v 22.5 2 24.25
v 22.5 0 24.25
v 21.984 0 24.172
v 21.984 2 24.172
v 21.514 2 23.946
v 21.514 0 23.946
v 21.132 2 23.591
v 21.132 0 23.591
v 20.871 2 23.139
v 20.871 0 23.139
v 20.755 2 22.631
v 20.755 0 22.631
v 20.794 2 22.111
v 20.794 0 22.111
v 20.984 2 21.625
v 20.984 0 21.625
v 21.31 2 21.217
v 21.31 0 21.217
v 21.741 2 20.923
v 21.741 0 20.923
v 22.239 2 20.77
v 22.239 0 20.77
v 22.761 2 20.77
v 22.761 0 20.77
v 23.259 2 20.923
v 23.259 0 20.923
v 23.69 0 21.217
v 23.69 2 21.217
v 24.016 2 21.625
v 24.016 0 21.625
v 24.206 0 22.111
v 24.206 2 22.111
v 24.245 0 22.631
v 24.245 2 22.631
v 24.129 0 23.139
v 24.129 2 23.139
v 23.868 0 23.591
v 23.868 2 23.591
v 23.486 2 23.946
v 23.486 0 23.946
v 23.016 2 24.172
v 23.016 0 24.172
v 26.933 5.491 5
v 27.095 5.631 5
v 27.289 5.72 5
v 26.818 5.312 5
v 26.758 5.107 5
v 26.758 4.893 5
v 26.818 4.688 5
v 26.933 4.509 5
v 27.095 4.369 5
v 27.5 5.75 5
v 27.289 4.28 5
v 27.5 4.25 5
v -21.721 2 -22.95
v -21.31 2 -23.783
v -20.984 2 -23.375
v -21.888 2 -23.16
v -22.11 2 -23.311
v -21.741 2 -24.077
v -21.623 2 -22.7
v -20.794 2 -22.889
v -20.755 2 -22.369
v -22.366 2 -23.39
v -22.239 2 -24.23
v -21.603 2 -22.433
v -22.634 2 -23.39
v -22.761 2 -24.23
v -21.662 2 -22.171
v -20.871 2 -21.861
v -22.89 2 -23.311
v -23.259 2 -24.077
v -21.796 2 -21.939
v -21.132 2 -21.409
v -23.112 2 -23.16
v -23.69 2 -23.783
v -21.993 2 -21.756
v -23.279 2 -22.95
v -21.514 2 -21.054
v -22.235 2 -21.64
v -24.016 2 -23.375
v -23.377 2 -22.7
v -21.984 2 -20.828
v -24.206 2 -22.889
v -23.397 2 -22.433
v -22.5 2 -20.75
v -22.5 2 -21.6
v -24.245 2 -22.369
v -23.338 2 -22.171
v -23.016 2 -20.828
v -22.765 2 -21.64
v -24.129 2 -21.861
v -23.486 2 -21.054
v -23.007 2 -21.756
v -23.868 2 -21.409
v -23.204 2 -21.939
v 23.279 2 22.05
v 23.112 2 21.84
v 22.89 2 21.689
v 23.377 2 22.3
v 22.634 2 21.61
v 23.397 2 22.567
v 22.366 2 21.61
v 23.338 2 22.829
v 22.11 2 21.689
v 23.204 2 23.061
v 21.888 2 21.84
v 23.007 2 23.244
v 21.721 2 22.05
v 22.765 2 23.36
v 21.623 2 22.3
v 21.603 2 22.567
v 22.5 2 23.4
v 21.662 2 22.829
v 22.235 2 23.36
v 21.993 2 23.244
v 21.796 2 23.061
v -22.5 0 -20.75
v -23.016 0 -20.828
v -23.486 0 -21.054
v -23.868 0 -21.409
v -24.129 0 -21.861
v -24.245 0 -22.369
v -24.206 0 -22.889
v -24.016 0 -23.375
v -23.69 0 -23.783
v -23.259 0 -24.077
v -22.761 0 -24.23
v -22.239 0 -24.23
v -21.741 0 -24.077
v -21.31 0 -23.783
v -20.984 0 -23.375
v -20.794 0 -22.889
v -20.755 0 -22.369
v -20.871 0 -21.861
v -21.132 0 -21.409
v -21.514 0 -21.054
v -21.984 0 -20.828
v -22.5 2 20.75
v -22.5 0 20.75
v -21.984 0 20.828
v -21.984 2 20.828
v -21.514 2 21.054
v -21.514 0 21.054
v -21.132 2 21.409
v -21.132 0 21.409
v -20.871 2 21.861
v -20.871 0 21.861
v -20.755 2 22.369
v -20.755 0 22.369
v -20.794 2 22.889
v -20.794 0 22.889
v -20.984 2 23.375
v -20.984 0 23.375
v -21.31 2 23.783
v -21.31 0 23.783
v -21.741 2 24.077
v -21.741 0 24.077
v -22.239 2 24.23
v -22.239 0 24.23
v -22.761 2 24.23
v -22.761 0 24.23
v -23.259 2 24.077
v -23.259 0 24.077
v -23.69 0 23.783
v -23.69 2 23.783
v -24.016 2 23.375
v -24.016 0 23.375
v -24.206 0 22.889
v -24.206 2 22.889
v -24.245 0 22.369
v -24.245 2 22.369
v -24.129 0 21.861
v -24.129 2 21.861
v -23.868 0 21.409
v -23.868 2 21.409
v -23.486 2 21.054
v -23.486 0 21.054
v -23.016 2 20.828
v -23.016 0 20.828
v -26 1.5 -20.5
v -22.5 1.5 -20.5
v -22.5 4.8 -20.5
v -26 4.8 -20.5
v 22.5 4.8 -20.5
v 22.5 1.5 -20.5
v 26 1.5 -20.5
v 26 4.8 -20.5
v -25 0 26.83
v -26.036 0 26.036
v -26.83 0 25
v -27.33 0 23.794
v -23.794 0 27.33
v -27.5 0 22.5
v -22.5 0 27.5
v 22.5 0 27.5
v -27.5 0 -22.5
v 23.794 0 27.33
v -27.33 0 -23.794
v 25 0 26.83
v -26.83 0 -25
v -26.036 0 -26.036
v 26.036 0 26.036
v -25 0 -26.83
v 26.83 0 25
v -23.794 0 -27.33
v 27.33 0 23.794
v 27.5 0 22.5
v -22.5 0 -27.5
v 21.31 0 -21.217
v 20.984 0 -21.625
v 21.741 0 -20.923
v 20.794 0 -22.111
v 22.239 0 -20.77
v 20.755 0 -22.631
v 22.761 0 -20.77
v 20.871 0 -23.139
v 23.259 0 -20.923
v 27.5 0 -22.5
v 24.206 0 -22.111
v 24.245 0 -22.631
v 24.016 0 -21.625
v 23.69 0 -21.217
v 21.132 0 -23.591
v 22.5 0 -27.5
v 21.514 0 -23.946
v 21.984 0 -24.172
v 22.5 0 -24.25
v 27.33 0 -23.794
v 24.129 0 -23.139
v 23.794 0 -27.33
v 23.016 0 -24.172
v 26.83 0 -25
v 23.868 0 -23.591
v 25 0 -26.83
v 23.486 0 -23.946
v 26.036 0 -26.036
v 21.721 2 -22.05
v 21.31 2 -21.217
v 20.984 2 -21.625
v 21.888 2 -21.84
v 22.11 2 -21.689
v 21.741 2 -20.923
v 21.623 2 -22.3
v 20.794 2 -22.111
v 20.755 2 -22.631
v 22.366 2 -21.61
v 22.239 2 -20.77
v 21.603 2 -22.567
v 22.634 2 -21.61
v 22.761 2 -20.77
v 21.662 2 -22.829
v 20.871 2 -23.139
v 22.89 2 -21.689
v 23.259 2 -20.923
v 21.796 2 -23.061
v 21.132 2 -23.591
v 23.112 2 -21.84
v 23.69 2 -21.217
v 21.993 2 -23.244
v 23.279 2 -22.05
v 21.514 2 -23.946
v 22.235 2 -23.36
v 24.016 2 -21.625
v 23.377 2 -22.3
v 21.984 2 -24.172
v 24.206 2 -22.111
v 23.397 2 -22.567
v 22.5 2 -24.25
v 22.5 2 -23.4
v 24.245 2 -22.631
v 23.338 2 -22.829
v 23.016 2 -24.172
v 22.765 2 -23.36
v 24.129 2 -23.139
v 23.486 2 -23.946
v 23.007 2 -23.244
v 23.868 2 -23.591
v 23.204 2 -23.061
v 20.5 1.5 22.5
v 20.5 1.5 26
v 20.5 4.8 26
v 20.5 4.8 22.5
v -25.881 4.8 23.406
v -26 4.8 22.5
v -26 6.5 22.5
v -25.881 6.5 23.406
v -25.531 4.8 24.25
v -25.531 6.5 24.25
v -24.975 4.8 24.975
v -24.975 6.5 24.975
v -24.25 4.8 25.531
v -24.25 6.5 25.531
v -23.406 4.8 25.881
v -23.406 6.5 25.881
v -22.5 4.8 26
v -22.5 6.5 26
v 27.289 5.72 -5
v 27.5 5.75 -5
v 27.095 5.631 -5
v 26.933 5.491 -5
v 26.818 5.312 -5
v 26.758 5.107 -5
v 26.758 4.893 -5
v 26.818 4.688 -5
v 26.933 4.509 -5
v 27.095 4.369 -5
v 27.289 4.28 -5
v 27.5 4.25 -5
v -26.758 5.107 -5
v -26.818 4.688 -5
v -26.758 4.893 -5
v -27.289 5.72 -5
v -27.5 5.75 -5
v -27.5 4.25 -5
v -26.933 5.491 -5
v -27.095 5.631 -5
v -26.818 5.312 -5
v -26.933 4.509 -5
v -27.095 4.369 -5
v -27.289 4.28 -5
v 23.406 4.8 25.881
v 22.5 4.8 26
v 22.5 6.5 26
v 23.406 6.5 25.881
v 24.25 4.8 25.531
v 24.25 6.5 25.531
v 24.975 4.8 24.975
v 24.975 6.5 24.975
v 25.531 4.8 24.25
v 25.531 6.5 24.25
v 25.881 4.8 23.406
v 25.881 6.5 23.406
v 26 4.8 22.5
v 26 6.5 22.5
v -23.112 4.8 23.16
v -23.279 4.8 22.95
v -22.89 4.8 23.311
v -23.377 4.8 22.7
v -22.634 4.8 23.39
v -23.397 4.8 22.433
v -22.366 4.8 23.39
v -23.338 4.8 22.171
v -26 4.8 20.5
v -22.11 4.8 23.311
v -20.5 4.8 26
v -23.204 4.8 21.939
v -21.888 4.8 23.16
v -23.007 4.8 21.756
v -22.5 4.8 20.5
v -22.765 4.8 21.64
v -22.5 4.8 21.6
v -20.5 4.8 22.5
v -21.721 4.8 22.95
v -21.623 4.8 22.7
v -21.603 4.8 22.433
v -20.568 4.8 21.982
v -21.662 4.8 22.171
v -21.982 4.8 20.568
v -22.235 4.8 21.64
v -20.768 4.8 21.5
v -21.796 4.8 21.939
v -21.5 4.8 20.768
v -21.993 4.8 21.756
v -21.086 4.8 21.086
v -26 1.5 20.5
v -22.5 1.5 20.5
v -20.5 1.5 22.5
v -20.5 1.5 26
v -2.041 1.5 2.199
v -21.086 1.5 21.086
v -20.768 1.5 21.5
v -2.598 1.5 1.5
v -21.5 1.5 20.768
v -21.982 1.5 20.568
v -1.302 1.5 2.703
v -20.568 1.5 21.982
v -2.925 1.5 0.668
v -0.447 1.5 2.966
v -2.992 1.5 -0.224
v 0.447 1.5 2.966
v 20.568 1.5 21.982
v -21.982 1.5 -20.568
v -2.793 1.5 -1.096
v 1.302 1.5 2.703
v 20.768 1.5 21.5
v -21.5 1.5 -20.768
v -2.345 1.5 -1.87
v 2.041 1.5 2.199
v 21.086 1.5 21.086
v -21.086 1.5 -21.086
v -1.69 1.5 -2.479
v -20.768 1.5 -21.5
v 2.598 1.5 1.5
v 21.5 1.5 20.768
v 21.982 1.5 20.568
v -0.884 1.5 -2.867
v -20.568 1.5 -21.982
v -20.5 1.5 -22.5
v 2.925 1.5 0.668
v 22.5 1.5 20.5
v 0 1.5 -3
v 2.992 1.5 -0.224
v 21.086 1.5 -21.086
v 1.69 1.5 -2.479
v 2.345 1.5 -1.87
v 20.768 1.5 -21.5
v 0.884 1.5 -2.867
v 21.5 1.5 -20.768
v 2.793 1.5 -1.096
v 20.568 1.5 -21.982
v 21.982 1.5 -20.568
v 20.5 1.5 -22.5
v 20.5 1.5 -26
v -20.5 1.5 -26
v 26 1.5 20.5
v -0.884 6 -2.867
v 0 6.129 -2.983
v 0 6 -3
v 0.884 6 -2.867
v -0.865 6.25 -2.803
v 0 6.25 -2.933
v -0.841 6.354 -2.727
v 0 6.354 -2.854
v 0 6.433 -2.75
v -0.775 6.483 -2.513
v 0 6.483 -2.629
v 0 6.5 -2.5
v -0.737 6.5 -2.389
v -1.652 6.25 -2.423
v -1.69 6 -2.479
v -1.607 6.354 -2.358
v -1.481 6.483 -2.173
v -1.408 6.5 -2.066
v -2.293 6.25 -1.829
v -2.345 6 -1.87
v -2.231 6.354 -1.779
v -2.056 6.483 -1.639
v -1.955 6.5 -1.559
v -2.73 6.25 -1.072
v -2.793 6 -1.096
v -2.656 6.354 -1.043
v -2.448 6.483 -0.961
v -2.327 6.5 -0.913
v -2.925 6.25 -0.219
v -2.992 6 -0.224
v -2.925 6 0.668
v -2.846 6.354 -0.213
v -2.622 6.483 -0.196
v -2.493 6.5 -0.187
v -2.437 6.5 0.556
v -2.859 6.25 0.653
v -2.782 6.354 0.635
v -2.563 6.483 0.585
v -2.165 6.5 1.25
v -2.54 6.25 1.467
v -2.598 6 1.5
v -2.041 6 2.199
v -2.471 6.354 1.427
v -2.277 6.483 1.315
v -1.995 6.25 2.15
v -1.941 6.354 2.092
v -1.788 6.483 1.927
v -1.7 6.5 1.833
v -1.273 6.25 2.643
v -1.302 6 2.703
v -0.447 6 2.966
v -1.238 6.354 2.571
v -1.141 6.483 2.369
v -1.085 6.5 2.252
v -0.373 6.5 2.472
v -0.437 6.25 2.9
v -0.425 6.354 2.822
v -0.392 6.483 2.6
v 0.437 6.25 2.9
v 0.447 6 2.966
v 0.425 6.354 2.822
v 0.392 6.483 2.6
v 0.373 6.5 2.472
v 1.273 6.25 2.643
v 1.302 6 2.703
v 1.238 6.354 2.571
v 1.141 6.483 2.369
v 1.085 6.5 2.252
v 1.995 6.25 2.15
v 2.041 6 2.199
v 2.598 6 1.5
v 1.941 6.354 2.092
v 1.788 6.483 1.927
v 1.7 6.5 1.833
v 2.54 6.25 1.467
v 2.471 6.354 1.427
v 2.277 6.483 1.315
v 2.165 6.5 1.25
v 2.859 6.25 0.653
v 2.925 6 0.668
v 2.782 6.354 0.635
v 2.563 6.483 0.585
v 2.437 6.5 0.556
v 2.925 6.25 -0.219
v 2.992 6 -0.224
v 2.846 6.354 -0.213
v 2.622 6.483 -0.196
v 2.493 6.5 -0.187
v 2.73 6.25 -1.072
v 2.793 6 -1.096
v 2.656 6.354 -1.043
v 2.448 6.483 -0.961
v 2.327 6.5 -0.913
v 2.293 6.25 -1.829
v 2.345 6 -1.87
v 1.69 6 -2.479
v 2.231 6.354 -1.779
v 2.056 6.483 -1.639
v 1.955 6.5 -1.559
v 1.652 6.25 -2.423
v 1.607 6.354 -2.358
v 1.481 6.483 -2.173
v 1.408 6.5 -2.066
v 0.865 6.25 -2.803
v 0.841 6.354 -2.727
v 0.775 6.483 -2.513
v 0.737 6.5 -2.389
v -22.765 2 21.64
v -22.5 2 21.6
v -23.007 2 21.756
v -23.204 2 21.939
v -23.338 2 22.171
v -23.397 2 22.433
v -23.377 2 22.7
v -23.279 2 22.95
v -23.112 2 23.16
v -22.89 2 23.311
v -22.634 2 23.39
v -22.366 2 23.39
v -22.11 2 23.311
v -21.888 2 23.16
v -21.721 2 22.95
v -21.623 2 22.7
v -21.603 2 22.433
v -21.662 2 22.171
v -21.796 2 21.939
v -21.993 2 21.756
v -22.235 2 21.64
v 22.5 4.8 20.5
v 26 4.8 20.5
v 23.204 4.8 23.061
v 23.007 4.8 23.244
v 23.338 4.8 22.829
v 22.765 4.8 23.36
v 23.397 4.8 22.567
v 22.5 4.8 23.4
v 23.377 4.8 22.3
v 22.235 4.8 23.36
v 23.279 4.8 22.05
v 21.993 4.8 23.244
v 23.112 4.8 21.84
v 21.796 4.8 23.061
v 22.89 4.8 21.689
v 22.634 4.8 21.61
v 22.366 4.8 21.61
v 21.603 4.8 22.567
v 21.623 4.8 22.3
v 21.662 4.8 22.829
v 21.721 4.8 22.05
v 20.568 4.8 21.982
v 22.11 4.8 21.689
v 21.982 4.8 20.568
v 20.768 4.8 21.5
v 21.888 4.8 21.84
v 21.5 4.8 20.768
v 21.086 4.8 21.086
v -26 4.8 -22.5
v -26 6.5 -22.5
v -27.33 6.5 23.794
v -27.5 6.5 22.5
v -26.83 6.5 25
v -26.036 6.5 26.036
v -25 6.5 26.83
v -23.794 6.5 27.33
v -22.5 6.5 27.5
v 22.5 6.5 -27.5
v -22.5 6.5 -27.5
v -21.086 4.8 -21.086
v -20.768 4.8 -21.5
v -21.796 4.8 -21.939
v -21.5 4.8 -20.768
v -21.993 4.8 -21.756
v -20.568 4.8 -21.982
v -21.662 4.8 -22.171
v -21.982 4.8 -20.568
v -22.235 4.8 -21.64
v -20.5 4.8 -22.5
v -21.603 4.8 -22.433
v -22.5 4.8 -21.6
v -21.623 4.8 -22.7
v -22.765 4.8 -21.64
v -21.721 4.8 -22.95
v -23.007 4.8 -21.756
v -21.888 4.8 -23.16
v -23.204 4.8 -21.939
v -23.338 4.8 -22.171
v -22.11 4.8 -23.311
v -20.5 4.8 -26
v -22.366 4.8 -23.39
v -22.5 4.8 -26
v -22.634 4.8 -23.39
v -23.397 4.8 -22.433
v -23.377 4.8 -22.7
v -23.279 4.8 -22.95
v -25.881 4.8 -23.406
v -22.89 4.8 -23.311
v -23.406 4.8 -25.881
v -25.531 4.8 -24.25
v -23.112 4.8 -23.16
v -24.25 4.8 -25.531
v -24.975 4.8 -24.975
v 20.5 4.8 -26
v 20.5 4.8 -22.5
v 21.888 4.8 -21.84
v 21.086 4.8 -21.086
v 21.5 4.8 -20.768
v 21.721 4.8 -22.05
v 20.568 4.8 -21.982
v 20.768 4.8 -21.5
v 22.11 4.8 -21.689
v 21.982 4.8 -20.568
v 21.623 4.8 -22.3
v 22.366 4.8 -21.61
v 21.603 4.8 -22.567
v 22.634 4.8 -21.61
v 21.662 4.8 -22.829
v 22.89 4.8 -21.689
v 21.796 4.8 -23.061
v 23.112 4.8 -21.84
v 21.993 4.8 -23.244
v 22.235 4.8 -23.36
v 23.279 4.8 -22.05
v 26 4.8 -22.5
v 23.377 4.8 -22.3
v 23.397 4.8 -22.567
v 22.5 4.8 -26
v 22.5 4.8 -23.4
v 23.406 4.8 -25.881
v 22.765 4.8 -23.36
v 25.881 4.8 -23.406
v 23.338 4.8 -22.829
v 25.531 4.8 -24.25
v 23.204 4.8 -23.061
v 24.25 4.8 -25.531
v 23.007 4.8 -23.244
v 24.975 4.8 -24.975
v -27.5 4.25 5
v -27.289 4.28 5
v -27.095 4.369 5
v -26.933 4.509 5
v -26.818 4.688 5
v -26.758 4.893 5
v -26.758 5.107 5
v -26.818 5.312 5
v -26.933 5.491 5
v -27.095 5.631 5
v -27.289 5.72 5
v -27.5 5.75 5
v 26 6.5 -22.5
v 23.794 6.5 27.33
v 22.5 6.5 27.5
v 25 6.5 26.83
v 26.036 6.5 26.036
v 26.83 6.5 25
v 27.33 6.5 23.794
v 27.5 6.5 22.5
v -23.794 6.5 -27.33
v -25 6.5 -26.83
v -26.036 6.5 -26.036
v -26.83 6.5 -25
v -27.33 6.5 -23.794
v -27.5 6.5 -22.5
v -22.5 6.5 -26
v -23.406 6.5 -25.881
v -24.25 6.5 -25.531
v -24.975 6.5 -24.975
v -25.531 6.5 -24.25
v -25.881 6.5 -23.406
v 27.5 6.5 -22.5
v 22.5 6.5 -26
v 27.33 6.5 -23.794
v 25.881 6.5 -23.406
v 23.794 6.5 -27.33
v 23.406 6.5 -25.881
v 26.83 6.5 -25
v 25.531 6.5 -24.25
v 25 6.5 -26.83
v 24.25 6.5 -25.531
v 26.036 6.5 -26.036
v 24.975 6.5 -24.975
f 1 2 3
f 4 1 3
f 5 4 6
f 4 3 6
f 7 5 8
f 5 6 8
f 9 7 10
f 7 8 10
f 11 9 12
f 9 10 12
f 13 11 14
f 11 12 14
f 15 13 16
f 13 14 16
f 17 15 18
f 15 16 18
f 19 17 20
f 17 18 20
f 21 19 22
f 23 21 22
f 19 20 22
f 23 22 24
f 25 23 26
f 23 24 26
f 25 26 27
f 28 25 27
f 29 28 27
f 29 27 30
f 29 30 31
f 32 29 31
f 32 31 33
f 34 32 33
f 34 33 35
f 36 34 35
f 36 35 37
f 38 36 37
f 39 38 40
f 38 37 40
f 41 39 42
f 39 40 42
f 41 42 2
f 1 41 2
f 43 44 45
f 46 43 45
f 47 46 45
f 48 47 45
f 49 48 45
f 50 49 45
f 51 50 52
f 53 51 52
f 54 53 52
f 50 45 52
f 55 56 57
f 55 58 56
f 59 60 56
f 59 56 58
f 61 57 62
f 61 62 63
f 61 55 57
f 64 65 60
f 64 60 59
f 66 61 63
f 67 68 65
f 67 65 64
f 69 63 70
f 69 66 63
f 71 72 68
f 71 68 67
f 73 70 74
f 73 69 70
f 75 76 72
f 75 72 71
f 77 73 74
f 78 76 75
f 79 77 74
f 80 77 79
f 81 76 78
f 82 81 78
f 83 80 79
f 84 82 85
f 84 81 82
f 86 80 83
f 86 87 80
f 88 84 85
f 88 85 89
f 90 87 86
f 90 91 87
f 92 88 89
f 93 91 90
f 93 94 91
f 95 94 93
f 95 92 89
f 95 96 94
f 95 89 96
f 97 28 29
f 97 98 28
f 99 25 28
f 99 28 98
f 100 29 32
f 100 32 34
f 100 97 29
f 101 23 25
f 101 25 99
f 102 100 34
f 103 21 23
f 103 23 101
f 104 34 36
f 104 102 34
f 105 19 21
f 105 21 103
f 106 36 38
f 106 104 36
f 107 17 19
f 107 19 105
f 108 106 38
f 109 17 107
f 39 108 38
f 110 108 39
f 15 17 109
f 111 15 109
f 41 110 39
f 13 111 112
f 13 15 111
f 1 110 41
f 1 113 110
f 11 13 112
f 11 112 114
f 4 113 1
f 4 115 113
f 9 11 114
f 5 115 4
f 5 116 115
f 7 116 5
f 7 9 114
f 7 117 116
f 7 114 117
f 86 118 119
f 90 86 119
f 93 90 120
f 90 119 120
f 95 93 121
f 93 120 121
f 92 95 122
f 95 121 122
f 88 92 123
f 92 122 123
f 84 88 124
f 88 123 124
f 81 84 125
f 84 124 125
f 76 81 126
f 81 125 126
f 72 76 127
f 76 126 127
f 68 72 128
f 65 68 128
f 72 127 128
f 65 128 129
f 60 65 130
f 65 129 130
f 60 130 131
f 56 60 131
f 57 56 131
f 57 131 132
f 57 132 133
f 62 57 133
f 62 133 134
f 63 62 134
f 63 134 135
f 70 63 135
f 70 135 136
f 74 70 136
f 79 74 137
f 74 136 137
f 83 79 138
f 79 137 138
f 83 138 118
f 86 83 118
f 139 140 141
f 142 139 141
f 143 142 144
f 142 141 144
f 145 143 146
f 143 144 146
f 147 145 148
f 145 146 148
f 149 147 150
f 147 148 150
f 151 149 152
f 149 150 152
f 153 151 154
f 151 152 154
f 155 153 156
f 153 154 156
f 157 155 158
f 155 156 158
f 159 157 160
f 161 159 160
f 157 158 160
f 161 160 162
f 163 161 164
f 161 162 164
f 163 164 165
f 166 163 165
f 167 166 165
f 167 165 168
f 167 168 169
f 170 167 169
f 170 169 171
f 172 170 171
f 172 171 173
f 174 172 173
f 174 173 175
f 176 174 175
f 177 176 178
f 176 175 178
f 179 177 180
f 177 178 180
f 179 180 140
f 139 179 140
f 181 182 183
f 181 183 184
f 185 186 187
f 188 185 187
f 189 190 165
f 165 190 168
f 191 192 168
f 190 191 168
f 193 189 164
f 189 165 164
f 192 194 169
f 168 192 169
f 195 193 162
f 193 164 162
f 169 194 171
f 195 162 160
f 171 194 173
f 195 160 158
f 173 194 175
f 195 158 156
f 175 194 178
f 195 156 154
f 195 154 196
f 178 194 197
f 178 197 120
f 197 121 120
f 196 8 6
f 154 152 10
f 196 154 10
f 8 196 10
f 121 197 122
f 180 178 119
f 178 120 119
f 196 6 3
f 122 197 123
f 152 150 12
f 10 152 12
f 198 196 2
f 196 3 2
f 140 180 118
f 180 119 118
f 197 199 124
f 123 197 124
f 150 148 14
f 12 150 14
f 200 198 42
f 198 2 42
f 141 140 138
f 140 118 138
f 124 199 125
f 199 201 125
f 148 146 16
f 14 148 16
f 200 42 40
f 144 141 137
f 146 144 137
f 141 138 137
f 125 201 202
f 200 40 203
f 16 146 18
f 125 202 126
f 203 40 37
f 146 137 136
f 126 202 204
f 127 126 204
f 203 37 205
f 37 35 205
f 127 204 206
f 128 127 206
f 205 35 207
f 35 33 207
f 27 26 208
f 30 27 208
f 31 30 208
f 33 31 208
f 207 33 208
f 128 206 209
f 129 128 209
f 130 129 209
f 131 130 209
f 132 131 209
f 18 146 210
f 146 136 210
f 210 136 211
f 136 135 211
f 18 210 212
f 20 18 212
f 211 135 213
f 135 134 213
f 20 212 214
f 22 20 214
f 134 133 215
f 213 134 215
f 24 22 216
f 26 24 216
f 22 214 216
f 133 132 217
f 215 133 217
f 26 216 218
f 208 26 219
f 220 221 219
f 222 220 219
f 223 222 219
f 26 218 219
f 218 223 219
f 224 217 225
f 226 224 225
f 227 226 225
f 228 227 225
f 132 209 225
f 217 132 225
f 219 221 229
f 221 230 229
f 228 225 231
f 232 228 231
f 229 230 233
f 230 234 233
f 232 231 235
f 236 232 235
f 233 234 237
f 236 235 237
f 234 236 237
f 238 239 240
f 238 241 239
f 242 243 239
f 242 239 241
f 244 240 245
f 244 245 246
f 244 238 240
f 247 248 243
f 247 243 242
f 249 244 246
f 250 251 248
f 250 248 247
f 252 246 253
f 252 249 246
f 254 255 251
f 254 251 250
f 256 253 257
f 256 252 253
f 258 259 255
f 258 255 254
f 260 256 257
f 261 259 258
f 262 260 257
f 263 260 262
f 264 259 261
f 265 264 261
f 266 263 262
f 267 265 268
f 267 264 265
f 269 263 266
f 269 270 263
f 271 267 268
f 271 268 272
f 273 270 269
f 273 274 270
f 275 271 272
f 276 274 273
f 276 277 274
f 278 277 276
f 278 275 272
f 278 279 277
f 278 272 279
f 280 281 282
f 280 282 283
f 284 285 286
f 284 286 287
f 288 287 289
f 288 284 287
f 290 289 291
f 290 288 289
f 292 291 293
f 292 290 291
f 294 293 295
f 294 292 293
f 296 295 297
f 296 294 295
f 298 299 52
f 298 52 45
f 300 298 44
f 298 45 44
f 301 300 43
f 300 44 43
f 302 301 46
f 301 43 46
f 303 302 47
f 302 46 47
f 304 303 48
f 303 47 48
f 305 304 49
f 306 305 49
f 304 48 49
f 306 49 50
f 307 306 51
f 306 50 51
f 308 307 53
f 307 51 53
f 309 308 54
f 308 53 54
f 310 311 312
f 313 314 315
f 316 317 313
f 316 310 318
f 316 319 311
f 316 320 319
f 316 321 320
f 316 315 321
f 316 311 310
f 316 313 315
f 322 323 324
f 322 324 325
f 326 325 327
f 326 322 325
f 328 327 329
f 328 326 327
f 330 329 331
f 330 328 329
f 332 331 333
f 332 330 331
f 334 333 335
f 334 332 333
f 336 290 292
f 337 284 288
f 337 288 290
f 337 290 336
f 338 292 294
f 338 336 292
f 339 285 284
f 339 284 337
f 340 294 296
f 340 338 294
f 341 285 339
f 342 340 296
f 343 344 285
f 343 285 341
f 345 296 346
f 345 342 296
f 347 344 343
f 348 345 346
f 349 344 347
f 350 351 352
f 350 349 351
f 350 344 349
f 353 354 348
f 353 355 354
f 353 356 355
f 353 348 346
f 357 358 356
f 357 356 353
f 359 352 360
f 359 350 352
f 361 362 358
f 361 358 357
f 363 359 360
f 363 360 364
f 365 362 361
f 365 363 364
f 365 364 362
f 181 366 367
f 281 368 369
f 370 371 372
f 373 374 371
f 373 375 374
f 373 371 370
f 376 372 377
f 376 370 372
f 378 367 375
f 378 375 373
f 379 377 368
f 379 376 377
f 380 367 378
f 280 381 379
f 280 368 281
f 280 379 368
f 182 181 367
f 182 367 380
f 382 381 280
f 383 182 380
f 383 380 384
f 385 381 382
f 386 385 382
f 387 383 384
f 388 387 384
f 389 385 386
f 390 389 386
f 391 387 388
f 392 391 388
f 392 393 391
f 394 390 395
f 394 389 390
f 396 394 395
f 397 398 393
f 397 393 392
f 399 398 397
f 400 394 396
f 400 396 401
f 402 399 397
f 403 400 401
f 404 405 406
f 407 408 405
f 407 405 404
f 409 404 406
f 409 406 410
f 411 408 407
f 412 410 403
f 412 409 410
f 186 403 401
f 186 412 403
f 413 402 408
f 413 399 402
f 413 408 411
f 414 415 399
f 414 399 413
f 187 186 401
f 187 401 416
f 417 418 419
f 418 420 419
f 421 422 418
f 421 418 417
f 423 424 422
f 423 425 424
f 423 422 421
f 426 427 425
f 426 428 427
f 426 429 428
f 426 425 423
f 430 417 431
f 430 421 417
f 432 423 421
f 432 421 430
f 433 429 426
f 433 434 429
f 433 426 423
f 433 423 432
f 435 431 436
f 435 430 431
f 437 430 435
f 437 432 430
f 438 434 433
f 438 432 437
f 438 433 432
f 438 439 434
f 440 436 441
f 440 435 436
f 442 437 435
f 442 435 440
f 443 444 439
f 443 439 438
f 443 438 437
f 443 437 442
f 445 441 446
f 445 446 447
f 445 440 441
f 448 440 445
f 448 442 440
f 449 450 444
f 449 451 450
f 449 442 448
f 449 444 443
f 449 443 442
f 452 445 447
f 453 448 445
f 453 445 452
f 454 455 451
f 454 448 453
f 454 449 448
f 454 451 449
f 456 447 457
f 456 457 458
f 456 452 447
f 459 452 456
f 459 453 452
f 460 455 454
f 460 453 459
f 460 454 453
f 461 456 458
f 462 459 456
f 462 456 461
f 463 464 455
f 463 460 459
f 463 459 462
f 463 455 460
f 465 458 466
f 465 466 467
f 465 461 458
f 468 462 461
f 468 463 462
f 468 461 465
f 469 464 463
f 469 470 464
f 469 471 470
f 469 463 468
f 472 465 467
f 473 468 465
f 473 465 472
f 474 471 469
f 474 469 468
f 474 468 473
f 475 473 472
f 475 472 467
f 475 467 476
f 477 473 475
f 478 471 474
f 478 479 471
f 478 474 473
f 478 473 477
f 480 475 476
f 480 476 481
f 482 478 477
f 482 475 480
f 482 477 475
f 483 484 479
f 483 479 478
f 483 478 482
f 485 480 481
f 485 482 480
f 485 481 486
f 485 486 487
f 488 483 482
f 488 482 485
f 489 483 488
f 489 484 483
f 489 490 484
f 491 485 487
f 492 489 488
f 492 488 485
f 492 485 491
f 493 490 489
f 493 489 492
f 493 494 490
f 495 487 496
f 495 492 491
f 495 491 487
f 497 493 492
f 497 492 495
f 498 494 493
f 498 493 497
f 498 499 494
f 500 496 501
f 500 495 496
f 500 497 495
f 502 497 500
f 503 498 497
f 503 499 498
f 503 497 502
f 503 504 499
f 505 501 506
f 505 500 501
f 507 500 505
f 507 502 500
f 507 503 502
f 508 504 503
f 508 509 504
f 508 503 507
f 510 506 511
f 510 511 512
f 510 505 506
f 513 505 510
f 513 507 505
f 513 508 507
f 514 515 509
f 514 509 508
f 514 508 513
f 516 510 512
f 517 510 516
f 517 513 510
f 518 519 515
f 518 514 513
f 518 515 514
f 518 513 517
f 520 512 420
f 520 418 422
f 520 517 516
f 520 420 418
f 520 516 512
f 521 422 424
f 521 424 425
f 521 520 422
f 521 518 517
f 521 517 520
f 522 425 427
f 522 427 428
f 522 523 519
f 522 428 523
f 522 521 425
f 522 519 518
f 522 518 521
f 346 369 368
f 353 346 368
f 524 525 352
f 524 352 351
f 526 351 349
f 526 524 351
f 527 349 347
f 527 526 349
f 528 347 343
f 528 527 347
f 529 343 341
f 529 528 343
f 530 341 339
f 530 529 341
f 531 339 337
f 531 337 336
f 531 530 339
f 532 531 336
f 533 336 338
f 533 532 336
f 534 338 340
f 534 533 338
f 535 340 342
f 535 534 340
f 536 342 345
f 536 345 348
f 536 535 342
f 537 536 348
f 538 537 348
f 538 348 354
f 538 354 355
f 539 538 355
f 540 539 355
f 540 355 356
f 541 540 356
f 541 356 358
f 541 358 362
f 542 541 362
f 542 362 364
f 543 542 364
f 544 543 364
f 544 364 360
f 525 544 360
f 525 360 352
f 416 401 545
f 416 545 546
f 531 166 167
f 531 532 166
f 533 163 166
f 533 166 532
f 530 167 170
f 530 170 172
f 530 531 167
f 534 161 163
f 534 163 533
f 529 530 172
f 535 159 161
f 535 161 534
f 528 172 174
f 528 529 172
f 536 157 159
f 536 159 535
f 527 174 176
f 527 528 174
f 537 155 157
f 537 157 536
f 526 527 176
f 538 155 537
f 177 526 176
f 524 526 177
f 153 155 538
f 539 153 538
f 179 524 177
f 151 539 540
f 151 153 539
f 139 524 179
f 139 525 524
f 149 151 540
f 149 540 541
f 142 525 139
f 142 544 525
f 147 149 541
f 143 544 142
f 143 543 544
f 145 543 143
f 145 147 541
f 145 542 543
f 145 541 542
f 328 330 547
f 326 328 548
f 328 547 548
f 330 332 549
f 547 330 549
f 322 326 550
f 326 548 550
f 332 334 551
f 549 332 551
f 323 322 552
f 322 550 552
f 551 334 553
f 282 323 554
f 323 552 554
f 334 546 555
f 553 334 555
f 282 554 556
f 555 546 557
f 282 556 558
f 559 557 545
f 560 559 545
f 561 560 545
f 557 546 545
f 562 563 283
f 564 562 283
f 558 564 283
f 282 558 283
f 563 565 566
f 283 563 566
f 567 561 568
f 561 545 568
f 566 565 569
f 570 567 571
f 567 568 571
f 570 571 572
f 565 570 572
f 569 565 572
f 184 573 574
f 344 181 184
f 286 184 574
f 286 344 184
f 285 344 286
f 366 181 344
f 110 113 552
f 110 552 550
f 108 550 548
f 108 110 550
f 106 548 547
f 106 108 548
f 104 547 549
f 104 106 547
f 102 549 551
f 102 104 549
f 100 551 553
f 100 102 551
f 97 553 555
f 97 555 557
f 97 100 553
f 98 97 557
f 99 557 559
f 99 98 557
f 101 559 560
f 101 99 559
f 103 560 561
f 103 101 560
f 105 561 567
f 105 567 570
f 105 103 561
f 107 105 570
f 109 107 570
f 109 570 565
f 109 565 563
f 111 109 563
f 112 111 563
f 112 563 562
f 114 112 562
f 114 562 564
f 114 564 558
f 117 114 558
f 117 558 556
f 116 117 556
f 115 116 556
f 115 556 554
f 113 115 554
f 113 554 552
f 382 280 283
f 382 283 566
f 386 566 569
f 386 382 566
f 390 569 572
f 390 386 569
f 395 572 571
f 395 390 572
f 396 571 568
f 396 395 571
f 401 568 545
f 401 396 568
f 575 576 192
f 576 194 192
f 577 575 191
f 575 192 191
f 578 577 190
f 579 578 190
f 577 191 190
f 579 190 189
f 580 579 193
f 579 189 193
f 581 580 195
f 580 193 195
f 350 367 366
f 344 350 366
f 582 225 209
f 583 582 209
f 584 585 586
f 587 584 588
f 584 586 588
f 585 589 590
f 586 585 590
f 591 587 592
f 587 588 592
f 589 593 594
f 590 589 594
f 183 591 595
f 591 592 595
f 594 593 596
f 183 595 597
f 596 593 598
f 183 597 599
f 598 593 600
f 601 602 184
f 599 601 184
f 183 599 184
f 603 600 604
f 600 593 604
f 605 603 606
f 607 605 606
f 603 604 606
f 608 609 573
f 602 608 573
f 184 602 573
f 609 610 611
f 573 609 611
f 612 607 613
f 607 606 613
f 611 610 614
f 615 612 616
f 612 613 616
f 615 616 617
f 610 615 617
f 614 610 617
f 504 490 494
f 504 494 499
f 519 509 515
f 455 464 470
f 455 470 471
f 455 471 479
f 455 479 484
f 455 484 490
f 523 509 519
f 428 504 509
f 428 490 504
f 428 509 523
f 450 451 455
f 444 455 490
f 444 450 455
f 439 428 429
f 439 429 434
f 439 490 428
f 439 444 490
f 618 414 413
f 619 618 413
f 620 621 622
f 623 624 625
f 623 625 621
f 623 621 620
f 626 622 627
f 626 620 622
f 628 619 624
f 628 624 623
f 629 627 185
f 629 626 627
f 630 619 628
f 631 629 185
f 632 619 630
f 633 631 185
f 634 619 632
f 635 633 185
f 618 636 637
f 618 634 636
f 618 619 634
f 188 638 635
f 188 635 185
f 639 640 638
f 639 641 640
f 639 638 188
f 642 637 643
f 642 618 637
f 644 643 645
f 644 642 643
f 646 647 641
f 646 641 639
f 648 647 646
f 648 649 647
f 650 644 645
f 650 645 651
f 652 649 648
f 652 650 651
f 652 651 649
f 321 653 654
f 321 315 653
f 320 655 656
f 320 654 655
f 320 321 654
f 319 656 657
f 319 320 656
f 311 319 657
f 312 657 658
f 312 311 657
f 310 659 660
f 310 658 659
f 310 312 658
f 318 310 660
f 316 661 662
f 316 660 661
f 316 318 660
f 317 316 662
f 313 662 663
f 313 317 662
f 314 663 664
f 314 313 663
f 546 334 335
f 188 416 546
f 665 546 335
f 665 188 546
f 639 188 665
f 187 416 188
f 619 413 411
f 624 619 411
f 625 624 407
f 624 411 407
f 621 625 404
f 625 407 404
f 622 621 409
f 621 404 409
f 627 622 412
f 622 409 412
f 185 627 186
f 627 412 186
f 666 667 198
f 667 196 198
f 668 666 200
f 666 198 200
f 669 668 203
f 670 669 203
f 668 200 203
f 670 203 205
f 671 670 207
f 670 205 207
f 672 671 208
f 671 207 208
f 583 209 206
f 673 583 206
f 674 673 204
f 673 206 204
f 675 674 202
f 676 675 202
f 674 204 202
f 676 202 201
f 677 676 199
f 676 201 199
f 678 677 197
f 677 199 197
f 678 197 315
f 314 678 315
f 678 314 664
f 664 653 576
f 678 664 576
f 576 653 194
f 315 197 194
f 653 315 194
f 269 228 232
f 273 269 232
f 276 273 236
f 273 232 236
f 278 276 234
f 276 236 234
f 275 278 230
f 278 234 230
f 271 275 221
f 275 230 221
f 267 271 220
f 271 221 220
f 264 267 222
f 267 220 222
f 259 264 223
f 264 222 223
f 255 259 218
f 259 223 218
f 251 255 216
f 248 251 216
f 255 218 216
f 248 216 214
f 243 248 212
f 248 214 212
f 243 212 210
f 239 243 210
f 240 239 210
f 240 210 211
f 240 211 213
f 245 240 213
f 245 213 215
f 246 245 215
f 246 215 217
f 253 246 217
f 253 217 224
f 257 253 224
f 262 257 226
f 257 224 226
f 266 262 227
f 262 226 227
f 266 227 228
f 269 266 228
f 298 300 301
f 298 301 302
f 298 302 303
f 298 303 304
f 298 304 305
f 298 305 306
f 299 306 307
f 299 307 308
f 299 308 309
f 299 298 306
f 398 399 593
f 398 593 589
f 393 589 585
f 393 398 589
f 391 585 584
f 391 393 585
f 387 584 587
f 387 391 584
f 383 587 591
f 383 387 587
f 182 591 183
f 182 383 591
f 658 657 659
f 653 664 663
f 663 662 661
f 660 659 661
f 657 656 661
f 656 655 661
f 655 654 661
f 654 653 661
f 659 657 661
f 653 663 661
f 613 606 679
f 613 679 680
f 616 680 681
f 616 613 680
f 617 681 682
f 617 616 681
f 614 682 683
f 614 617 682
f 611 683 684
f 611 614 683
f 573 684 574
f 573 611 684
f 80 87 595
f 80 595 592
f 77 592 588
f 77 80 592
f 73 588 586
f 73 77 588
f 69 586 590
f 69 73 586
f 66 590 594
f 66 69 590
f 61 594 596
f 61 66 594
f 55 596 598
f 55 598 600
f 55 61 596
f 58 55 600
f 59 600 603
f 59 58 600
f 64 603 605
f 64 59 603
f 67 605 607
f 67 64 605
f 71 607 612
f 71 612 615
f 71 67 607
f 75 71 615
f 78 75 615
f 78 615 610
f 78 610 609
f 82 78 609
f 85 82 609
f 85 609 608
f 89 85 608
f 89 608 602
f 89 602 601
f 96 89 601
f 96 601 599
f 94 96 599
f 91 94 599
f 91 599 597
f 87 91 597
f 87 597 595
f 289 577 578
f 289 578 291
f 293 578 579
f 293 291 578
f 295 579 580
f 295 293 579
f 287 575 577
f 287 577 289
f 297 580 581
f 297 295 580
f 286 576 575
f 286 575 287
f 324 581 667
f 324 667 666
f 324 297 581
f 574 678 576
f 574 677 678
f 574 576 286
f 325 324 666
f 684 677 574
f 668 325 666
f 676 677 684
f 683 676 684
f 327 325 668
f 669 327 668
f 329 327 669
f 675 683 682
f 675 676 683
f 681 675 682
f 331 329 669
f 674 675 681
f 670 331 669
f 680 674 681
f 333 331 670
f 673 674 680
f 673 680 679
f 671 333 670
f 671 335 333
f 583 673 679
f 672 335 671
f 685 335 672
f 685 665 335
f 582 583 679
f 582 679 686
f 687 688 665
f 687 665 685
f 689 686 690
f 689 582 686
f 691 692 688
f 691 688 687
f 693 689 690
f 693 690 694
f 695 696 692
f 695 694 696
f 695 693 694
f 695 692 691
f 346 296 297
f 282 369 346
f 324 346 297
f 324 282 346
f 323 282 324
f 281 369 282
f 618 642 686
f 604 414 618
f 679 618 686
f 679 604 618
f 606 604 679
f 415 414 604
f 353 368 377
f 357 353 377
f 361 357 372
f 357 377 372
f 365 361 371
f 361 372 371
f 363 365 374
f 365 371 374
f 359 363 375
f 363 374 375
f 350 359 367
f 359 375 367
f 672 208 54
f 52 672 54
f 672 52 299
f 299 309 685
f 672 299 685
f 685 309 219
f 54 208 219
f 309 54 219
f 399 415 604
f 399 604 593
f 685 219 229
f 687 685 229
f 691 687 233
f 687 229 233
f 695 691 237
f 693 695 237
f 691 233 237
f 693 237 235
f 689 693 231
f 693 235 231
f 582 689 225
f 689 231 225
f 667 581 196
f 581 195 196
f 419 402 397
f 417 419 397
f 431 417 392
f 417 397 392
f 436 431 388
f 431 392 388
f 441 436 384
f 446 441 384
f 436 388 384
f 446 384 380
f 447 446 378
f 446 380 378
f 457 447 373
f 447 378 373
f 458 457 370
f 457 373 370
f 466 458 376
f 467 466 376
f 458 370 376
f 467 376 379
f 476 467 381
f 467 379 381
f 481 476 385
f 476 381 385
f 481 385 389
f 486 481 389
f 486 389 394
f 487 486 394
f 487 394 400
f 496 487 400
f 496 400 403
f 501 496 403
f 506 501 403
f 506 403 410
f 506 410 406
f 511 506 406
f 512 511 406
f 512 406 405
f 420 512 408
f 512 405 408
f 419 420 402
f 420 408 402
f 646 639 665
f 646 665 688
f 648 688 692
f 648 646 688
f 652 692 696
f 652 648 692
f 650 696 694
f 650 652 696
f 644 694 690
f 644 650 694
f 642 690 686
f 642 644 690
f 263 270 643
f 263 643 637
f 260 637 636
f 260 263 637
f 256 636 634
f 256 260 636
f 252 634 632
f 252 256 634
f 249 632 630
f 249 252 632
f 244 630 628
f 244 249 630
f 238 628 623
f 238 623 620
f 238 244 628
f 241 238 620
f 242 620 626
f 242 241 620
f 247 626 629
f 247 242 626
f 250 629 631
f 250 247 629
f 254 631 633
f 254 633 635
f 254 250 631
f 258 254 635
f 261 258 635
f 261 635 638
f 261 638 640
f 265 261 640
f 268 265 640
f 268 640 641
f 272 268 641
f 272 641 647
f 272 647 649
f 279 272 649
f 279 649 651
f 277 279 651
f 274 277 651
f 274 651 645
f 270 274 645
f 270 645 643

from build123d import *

# Parameters (mm, degrees)
BOSS_EXTRUDE1_DEPTH = 1.5
BOSS_EXTRUDE2_DEPTH = 5
SKETCH5_R           = 3
BOSS_EXTRUDE3_DEPTH = 5
SKETCH6_R           = 0.9
BOSS_EXTRUDE4_DEPTH = 3.3
FILLET1_R           = 0.5
SKETCH7_R           = 1.75
CUT_EXTRUDE1_DEPTH  = 2
SKETCH9_R           = 0.75
CUT_EXTRUDE2_DEPTH  = 5


with BuildPart() as part:
    # Sketch1 → Boss-Extrude1 (new body)
    with BuildSketch(Plane(origin=(0, 0, 0), x_dir=(1, 0, 0), z_dir=(0, 1, 0))):
        with BuildLine():
            Line((-22.5, -27.5), (22.5, -27.5))
            ThreePointArc((22.5, -27.5), (26.035533906, -26.035533906), (27.5, -22.5))
            Line((27.5, -22.5), (27.5, 22.5))
            ThreePointArc((27.5, 22.5), (26.035533906, 26.035533906), (22.5, 27.5))
            Line((22.5, 27.5), (-22.5, 27.5))
            ThreePointArc((-22.5, 27.5), (-26.035533906, 26.035533906), (-27.5, 22.5))
            Line((-27.5, 22.5), (-27.5, -22.5))
            ThreePointArc((-27.5, -22.5), (-26.035533906, -26.035533906), (-22.5, -27.5))
        make_face()
    extrude(amount=BOSS_EXTRUDE1_DEPTH)

    # Sketch2 → Boss-Extrude2 (add)
    with BuildSketch(Plane(origin=(0, 1.5, 0), x_dir=(1, 0, 0), z_dir=(0, 1, 0))):
        with BuildLine():
            Line((-27.5, 22.5), (-27.5, -22.5))
            ThreePointArc((-27.5, -22.5), (-26.035533906, -26.035533906), (-22.5, -27.5))
            Line((-22.5, -27.5), (22.5, -27.5))
            ThreePointArc((22.5, -27.5), (26.035533906, -26.035533906), (27.5, -22.5))
            Line((27.5, -22.5), (27.5, 22.5))
            ThreePointArc((27.5, 22.5), (26.035533906, 26.035533906), (22.5, 27.5))
            Line((22.5, 27.5), (-22.5, 27.5))
            ThreePointArc((-22.5, 27.5), (-26.035533906, 26.035533906), (-27.5, 22.5))
        make_face()
        with BuildLine():
            Line((-26, 22.5), (-26, -22.5))
            ThreePointArc((-26, -22.5), (-24.974873734, -24.974873734), (-22.5, -26))
            Line((-22.5, -26), (22.5, -26))
            ThreePointArc((22.5, -26), (24.974873734, -24.974873734), (26, -22.5))
            Line((26, -22.5), (26, 22.5))
            ThreePointArc((26, 22.5), (24.974873734, 24.974873734), (22.5, 26))
            Line((22.5, 26), (-22.5, 26))
            ThreePointArc((-22.5, 26), (-24.974873734, 24.974873734), (-26, 22.5))
        make_face(mode=Mode.SUBTRACT)
    extrude(amount=BOSS_EXTRUDE2_DEPTH)

    # Sketch5 → Boss-Extrude3 (add)
    with BuildSketch(Plane(origin=(0, 1.5, 0), x_dir=(1, 0, 0), z_dir=(0, 1, 0))):
        with Locations(Location((0, 0, 0), (0, 0, 90))):
            Circle(SKETCH5_R)
    extrude(amount=BOSS_EXTRUDE3_DEPTH)

    # Sketch6 → Boss-Extrude4 (add)
    # profile 1 of 4: a face of its own
    with BuildSketch(Plane(origin=(0, 1.5, 0), x_dir=(1, 0, 0), z_dir=(0, 1, 0))):
        with BuildLine():
            Line((-20.5, 26), (-20.5, 22.5))
            ThreePointArc((-20.5, 22.5), (-21.085786438, 21.085786438), (-22.5, 20.5))
            Line((-22.5, 20.5), (-26, 20.5))
            Line((-26, 20.5), (-26, 22.5))
            ThreePointArc((-26, 22.5), (-24.974873734, 24.974873734), (-22.5, 26))
            Line((-22.5, 26), (-20.5, 26))
        make_face()
        with Locations(Location((-22.5, 22.5, 0), (0, 0, 270))):
            Circle(SKETCH6_R, mode=Mode.SUBTRACT)
    # profile 2 of 4: a face of its own
    with BuildSketch(Plane(origin=(0, 1.5, 0), x_dir=(1, 0, 0), z_dir=(0, 1, 0))):
        with BuildLine():
            Line((22.5, 26), (20.5, 26))
            Line((20.5, 26), (20.5, 22.5))
            ThreePointArc((20.5, 22.5), (21.085786438, 21.085786438), (22.5, 20.5))
            Line((22.5, 20.5), (26, 20.5))
            Line((26, 20.5), (26, 22.5))
            ThreePointArc((26, 22.5), (24.974873734, 24.974873734), (22.5, 26))
        make_face()
        with Locations(Location((22.5, 22.5, 0), (0, 0, 90))):
            Circle(SKETCH6_R, mode=Mode.SUBTRACT)
    # profile 3 of 4: a face of its own
    with BuildSketch(Plane(origin=(0, 1.5, 0), x_dir=(1, 0, 0), z_dir=(0, 1, 0))):
        with BuildLine():
            Line((20.5, -26), (20.5, -22.5))
            ThreePointArc((20.5, -22.5), (21.085786438, -21.085786438), (22.5, -20.5))
            Line((22.5, -20.5), (26, -20.5))
            Line((26, -20.5), (26, -22.5))
            ThreePointArc((26, -22.5), (24.974873734, -24.974873734), (22.5, -26))
            Line((22.5, -26), (20.5, -26))
        make_face()
        with Locations(Location((22.5, -22.5, 0), (0, 0, 270))):
            Circle(SKETCH6_R, mode=Mode.SUBTRACT)
    # profile 4 of 4: a face of its own
    with BuildSketch(Plane(origin=(0, 1.5, 0), x_dir=(1, 0, 0), z_dir=(0, 1, 0))):
        with BuildLine():
            Line((-22.5, -26), (-20.5, -26))
            Line((-20.5, -26), (-20.5, -22.5))
            ThreePointArc((-20.5, -22.5), (-21.085786438, -21.085786438), (-22.5, -20.5))
            Line((-22.5, -20.5), (-26, -20.5))
            Line((-26, -20.5), (-26, -22.5))
            ThreePointArc((-26, -22.5), (-24.974873734, -24.974873734), (-22.5, -26))
        make_face()
        with Locations(Location((-22.5, -22.5, 0), (0, 0, 90))):
            Circle(SKETCH6_R, mode=Mode.SUBTRACT)
    extrude(amount=BOSS_EXTRUDE4_DEPTH)

    # Fillet1
    fillet1_edges = [part.edges().sort_by_distance(p)[0] for p in [
        (0, 6.5, 3),
    ]]
    fillet(fillet1_edges, radius=FILLET1_R)

    # Sketch7 → Cut-Extrude1 (cut)
    with BuildSketch(Plane.XZ):
        with Locations(Location((-22.5, 22.5, 0), (0, 0, 270))):
            Circle(SKETCH7_R)
        with Locations(Location((22.5, 22.5, 0), (0, 0, 90))):
            Circle(SKETCH7_R)
        with Locations(Location((22.5, -22.5, 0), (0, 0, 270))):
            Circle(SKETCH7_R)
        with Locations(Location((-22.5, -22.5, 0), (0, 0, 90))):
            Circle(SKETCH7_R)
    extrude(amount=-CUT_EXTRUDE1_DEPTH, mode=Mode.SUBTRACT)

    # Sketch9 → Cut-Extrude2 (cut, symmetric)
    with BuildSketch(Plane.XY):
        with Locations((-27.5, 5)):
            Circle(SKETCH9_R)
        with Locations((27.5, 5)):
            Circle(SKETCH9_R)
    extrude(amount=CUT_EXTRUDE2_DEPTH, both=True, mode=Mode.SUBTRACT)


solid = part.part
